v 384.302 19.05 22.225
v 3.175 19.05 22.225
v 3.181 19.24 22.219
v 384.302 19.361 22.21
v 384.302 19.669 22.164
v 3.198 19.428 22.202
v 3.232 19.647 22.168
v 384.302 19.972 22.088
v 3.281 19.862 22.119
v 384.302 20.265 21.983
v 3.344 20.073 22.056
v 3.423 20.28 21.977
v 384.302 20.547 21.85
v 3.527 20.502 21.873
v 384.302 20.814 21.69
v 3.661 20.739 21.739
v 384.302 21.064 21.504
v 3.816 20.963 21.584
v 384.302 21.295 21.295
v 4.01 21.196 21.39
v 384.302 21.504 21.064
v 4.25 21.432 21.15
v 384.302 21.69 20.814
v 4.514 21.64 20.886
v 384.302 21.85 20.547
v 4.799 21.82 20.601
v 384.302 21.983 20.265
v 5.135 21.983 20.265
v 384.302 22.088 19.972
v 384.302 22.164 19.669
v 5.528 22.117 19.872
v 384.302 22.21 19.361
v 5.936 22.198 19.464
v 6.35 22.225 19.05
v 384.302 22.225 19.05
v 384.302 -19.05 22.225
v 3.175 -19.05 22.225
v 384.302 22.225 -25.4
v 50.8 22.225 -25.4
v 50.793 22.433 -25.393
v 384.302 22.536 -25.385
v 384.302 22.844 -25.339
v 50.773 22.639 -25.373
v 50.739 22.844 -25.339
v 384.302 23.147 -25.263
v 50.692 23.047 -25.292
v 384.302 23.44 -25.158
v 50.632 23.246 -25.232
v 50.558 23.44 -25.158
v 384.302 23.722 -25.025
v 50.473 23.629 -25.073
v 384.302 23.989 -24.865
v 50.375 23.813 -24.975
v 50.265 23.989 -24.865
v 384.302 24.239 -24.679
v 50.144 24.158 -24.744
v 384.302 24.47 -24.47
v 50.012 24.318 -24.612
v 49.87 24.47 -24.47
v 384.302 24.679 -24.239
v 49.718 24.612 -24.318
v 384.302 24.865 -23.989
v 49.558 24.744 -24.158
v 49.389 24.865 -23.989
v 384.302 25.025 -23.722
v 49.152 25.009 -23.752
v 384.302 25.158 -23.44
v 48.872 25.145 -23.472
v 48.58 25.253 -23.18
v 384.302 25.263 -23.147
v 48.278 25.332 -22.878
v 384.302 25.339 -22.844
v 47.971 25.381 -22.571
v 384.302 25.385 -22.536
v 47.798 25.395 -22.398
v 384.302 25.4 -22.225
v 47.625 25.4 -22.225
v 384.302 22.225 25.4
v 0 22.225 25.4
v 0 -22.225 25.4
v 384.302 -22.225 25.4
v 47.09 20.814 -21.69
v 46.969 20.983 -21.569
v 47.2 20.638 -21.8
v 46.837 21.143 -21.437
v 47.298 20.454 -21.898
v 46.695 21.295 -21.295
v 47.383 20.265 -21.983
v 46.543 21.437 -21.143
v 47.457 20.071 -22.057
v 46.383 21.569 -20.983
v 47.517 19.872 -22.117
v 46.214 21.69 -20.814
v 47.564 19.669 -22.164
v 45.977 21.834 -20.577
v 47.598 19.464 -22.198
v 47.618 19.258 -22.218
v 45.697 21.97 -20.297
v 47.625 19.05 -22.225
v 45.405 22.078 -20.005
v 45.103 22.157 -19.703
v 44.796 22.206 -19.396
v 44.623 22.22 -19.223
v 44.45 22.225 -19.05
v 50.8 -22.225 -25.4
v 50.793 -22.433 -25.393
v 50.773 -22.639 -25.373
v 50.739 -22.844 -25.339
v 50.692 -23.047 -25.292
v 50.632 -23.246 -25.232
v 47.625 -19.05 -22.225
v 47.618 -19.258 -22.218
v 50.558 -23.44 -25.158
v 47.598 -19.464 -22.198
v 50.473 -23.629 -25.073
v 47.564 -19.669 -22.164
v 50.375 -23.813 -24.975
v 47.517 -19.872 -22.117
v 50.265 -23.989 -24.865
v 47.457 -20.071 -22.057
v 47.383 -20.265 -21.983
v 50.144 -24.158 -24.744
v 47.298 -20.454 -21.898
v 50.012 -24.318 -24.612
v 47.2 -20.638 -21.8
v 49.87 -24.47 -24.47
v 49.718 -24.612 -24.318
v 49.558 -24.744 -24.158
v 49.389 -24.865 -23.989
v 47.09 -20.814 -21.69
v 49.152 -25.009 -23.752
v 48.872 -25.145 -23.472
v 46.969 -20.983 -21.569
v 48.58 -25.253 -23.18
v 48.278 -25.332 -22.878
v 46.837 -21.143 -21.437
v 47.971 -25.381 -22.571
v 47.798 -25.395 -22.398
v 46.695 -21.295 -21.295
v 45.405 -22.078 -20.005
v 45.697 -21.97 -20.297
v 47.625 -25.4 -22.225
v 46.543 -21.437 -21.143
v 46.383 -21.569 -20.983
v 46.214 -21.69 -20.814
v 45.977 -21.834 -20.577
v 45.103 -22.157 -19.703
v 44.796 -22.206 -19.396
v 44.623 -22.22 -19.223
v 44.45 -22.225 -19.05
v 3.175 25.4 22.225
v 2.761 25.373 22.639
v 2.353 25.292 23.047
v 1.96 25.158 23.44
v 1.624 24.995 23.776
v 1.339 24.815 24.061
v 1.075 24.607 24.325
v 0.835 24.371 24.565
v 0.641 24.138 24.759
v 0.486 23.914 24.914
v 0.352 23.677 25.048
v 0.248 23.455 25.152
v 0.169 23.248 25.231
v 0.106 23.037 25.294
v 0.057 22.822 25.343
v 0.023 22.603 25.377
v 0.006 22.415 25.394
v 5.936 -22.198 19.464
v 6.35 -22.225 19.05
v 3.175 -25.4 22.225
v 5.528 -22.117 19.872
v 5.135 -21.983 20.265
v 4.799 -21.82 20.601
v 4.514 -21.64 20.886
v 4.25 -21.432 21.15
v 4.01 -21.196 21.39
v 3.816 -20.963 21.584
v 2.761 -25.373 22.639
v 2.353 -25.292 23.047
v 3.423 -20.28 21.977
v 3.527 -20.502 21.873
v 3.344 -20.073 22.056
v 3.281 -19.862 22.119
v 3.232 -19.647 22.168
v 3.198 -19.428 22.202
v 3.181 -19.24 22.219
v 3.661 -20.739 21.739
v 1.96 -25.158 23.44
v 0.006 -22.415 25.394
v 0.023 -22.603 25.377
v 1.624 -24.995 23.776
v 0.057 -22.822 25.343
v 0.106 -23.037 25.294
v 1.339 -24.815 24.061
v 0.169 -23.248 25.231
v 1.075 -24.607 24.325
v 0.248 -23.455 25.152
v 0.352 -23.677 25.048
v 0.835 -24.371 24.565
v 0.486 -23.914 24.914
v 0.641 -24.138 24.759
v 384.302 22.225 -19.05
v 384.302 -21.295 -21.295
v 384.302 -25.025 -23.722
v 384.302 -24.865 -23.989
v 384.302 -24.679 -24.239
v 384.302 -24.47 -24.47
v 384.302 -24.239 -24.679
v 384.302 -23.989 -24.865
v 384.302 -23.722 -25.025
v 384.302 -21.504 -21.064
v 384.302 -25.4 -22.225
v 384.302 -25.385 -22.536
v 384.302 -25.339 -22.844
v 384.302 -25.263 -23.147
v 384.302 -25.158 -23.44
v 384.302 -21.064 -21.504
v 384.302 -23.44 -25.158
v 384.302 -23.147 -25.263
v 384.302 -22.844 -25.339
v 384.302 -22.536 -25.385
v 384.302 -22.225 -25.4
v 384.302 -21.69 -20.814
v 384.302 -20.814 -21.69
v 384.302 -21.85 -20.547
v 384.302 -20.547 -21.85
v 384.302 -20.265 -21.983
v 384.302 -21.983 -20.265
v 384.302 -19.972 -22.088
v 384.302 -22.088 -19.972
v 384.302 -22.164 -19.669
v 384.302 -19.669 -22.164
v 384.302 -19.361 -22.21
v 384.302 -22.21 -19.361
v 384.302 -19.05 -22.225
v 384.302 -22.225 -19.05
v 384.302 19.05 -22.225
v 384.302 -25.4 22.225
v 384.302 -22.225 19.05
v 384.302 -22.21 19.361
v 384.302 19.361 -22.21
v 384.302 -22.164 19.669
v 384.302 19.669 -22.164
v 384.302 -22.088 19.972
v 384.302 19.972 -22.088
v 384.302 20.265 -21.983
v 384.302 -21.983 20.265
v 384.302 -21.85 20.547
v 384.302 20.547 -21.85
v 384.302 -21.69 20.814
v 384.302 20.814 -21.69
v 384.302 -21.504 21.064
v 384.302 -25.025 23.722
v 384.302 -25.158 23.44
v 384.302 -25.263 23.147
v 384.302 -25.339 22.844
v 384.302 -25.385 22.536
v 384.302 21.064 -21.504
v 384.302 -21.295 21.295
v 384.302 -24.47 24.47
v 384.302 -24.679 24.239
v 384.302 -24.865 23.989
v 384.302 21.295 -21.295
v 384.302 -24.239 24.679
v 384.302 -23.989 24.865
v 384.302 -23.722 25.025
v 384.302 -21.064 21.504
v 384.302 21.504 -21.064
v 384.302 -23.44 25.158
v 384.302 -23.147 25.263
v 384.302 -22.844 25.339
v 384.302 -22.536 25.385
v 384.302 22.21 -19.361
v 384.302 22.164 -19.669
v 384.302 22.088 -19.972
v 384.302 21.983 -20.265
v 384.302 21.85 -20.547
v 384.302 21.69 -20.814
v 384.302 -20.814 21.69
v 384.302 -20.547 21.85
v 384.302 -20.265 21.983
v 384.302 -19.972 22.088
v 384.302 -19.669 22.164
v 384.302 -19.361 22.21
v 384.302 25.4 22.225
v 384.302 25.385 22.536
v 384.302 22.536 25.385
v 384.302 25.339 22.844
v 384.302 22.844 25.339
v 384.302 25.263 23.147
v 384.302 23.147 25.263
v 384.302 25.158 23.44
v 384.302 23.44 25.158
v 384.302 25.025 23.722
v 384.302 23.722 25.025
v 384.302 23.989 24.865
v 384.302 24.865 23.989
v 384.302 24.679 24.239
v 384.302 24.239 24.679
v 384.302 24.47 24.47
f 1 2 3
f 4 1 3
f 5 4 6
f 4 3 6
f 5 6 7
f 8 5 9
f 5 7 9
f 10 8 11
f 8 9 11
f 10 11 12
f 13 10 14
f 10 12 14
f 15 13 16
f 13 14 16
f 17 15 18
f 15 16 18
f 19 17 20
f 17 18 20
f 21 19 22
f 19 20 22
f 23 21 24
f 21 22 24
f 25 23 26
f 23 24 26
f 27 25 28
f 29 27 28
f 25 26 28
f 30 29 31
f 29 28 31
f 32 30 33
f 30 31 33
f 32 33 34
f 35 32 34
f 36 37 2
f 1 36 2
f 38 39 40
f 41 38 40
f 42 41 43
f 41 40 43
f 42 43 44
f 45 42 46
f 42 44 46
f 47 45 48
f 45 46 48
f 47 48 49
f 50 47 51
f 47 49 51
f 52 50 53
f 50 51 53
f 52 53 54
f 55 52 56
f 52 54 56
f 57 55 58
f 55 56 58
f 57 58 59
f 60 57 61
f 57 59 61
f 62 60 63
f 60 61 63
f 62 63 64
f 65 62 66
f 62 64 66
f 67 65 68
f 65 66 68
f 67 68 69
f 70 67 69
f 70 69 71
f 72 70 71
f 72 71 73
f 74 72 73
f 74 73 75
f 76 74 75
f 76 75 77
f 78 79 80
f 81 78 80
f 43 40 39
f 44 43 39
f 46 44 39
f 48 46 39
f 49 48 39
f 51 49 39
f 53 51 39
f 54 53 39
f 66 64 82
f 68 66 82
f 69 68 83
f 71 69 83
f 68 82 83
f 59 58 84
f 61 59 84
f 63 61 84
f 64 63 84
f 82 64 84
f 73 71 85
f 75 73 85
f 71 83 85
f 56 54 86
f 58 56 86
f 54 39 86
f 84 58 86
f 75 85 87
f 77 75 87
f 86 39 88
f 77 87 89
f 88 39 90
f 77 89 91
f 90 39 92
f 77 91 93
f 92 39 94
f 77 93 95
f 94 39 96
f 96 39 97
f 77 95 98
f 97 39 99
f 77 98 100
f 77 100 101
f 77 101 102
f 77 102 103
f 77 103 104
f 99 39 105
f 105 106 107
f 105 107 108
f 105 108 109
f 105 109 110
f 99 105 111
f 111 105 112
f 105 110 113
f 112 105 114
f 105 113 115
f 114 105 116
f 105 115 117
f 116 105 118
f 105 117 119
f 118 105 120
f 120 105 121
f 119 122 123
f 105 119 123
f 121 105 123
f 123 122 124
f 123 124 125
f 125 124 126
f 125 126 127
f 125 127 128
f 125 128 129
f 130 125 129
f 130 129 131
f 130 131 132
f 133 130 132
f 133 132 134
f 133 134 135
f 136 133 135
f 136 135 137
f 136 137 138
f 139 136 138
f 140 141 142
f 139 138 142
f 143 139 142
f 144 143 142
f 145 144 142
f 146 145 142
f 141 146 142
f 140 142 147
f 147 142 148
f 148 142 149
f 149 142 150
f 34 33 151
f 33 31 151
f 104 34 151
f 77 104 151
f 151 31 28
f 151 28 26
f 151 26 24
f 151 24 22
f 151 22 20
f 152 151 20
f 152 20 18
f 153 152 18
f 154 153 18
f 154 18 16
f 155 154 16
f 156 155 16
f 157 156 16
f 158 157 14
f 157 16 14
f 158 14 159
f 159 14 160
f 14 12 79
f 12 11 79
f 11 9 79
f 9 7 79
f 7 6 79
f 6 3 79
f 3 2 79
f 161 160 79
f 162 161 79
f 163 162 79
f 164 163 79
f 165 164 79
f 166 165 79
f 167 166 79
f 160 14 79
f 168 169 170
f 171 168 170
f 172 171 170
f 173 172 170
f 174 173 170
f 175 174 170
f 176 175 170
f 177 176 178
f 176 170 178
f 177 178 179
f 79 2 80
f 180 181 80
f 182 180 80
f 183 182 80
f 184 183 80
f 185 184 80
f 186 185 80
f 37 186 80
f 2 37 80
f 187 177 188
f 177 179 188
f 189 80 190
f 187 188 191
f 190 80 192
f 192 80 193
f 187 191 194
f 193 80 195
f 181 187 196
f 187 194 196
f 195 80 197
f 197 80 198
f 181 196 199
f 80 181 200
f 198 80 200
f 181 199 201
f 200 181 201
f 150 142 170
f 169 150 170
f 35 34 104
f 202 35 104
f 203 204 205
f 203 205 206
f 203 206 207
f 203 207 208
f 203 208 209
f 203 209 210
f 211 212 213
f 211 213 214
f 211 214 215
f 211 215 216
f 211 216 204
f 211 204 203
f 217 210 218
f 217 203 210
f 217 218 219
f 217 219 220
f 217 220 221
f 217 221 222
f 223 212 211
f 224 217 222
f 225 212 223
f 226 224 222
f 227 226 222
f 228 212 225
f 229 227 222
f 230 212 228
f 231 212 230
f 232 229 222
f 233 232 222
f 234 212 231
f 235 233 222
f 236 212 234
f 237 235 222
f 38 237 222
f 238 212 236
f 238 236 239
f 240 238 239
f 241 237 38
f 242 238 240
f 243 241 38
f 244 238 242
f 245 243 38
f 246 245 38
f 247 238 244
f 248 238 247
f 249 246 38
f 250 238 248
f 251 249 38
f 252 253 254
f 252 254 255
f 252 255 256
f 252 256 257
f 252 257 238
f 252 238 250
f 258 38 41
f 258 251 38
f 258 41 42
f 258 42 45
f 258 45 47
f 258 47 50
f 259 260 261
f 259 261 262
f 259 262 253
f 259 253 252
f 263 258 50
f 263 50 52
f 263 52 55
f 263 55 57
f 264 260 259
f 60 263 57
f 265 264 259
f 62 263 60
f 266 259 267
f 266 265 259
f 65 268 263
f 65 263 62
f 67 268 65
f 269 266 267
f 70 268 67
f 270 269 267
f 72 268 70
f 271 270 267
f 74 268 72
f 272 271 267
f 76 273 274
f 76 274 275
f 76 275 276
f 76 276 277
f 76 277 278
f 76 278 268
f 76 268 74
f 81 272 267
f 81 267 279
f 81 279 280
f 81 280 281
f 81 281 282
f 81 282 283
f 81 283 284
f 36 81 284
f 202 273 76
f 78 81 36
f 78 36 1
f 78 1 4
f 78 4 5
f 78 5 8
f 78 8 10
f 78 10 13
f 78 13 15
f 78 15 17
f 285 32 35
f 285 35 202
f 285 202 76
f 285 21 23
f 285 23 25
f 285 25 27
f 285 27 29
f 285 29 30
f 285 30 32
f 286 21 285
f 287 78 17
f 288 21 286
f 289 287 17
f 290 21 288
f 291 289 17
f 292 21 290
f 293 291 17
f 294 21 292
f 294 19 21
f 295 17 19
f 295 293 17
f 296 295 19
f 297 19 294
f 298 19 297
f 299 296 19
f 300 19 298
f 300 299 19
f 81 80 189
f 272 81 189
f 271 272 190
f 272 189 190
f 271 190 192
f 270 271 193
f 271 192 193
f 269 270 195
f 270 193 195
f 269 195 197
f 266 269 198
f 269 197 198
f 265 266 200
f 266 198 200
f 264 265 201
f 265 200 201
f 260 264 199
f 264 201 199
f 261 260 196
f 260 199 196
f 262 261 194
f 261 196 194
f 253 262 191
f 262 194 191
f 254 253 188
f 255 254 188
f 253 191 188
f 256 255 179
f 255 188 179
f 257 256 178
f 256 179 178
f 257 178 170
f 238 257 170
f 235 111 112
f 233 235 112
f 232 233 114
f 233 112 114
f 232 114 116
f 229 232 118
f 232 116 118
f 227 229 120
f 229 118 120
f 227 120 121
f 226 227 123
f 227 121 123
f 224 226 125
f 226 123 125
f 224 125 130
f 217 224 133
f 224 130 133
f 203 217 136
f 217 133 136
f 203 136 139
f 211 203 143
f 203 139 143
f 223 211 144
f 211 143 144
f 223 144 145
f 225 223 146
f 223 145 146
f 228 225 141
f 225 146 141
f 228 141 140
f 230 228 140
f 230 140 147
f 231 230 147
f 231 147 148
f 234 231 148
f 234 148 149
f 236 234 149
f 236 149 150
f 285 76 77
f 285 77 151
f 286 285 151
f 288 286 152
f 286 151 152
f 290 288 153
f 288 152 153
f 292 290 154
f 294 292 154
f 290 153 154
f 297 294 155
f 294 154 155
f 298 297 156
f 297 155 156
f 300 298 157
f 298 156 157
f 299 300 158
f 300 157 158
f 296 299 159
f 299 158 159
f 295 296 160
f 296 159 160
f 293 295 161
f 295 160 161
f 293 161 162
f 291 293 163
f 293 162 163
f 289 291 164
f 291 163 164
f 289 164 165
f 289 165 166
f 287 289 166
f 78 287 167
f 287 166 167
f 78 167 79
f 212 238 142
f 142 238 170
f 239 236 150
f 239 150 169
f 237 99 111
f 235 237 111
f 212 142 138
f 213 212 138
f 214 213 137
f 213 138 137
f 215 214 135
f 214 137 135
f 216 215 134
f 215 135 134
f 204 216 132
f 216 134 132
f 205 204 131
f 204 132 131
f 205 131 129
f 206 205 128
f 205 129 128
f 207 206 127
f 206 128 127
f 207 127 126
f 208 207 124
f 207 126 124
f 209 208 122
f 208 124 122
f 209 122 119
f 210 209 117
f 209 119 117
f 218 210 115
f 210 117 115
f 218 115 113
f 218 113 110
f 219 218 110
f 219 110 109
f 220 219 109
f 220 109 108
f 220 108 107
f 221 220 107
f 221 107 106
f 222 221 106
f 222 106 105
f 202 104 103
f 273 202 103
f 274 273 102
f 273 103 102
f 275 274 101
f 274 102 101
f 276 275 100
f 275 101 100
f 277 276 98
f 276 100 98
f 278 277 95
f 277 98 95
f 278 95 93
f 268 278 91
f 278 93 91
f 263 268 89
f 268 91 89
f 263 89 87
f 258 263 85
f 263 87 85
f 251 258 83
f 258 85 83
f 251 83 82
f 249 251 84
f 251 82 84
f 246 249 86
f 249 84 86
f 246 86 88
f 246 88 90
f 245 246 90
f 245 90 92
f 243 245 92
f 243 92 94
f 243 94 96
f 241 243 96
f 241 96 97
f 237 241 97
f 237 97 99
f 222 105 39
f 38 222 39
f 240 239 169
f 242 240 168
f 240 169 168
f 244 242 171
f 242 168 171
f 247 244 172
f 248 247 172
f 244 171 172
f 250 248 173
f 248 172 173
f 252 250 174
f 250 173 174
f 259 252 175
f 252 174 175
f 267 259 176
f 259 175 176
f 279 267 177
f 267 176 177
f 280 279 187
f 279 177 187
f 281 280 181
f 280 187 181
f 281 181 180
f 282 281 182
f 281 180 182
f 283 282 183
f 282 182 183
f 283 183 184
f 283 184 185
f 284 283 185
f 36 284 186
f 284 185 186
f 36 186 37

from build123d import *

# Parameters (mm, degrees)
F1_DEPTH      = 384.302
F3_DEPTH      = 25.4
F3_DEPTH_BACK = 25.4


with BuildPart() as f1:
    # F0 (on Right) → F1 (new body)
    with BuildSketch(Plane.YZ):
        with BuildLine():
            ThreePointArc((25.4, 22.225), (24.4700640303, 24.4700640303), (22.225, 25.4))
            Line((22.225, 25.4), (-22.225, 25.4))
            ThreePointArc((-22.225, 25.4), (-24.4700640303, 24.4700640303), (-25.4, 22.225))
            Line((-25.4, 22.225), (-25.4, -22.225))
            ThreePointArc((-25.4, -22.225), (-24.4700640303, -24.4700640303), (-22.225, -25.4))
            Line((-22.225, -25.4), (22.225, -25.4))
            ThreePointArc((22.225, -25.4), (24.4700640303, -24.4700640303), (25.4, -22.225))
            Line((25.4, -22.225), (25.4, 22.225))
        make_face()
        with BuildLine():
            Line((-19.05, 22.225), (19.05, 22.225))
            ThreePointArc((19.05, 22.225), (21.2950640303, 21.2950640303), (22.225, 19.05))
            Line((22.225, 19.05), (22.225, -19.05))
            ThreePointArc((22.225, -19.05), (21.2950640303, -21.2950640303), (19.05, -22.225))
            Line((19.05, -22.225), (-19.05, -22.225))
            ThreePointArc((-19.05, -22.225), (-21.2950640303, -21.2950640303), (-22.225, -19.05))
            Line((-22.225, -19.05), (-22.225, 19.05))
            ThreePointArc((-22.225, 19.05), (-21.2950640303, 21.2950640303), (-19.05, 22.225))
        make_face(mode=Mode.SUBTRACT)
    extrude(amount=F1_DEPTH)

    # F2 (on Front) → F3 (cut, two sides)
    with BuildSketch(Plane.XZ) as f3_sk:
        Polygon((0, -25.4), (50.8, -25.4), (0, 25.4), align=None)
    extrude(amount=-F3_DEPTH, mode=Mode.SUBTRACT)
    extrude(f3_sk.sketch, amount=F3_DEPTH_BACK, mode=Mode.SUBTRACT)


solid = f1.part
